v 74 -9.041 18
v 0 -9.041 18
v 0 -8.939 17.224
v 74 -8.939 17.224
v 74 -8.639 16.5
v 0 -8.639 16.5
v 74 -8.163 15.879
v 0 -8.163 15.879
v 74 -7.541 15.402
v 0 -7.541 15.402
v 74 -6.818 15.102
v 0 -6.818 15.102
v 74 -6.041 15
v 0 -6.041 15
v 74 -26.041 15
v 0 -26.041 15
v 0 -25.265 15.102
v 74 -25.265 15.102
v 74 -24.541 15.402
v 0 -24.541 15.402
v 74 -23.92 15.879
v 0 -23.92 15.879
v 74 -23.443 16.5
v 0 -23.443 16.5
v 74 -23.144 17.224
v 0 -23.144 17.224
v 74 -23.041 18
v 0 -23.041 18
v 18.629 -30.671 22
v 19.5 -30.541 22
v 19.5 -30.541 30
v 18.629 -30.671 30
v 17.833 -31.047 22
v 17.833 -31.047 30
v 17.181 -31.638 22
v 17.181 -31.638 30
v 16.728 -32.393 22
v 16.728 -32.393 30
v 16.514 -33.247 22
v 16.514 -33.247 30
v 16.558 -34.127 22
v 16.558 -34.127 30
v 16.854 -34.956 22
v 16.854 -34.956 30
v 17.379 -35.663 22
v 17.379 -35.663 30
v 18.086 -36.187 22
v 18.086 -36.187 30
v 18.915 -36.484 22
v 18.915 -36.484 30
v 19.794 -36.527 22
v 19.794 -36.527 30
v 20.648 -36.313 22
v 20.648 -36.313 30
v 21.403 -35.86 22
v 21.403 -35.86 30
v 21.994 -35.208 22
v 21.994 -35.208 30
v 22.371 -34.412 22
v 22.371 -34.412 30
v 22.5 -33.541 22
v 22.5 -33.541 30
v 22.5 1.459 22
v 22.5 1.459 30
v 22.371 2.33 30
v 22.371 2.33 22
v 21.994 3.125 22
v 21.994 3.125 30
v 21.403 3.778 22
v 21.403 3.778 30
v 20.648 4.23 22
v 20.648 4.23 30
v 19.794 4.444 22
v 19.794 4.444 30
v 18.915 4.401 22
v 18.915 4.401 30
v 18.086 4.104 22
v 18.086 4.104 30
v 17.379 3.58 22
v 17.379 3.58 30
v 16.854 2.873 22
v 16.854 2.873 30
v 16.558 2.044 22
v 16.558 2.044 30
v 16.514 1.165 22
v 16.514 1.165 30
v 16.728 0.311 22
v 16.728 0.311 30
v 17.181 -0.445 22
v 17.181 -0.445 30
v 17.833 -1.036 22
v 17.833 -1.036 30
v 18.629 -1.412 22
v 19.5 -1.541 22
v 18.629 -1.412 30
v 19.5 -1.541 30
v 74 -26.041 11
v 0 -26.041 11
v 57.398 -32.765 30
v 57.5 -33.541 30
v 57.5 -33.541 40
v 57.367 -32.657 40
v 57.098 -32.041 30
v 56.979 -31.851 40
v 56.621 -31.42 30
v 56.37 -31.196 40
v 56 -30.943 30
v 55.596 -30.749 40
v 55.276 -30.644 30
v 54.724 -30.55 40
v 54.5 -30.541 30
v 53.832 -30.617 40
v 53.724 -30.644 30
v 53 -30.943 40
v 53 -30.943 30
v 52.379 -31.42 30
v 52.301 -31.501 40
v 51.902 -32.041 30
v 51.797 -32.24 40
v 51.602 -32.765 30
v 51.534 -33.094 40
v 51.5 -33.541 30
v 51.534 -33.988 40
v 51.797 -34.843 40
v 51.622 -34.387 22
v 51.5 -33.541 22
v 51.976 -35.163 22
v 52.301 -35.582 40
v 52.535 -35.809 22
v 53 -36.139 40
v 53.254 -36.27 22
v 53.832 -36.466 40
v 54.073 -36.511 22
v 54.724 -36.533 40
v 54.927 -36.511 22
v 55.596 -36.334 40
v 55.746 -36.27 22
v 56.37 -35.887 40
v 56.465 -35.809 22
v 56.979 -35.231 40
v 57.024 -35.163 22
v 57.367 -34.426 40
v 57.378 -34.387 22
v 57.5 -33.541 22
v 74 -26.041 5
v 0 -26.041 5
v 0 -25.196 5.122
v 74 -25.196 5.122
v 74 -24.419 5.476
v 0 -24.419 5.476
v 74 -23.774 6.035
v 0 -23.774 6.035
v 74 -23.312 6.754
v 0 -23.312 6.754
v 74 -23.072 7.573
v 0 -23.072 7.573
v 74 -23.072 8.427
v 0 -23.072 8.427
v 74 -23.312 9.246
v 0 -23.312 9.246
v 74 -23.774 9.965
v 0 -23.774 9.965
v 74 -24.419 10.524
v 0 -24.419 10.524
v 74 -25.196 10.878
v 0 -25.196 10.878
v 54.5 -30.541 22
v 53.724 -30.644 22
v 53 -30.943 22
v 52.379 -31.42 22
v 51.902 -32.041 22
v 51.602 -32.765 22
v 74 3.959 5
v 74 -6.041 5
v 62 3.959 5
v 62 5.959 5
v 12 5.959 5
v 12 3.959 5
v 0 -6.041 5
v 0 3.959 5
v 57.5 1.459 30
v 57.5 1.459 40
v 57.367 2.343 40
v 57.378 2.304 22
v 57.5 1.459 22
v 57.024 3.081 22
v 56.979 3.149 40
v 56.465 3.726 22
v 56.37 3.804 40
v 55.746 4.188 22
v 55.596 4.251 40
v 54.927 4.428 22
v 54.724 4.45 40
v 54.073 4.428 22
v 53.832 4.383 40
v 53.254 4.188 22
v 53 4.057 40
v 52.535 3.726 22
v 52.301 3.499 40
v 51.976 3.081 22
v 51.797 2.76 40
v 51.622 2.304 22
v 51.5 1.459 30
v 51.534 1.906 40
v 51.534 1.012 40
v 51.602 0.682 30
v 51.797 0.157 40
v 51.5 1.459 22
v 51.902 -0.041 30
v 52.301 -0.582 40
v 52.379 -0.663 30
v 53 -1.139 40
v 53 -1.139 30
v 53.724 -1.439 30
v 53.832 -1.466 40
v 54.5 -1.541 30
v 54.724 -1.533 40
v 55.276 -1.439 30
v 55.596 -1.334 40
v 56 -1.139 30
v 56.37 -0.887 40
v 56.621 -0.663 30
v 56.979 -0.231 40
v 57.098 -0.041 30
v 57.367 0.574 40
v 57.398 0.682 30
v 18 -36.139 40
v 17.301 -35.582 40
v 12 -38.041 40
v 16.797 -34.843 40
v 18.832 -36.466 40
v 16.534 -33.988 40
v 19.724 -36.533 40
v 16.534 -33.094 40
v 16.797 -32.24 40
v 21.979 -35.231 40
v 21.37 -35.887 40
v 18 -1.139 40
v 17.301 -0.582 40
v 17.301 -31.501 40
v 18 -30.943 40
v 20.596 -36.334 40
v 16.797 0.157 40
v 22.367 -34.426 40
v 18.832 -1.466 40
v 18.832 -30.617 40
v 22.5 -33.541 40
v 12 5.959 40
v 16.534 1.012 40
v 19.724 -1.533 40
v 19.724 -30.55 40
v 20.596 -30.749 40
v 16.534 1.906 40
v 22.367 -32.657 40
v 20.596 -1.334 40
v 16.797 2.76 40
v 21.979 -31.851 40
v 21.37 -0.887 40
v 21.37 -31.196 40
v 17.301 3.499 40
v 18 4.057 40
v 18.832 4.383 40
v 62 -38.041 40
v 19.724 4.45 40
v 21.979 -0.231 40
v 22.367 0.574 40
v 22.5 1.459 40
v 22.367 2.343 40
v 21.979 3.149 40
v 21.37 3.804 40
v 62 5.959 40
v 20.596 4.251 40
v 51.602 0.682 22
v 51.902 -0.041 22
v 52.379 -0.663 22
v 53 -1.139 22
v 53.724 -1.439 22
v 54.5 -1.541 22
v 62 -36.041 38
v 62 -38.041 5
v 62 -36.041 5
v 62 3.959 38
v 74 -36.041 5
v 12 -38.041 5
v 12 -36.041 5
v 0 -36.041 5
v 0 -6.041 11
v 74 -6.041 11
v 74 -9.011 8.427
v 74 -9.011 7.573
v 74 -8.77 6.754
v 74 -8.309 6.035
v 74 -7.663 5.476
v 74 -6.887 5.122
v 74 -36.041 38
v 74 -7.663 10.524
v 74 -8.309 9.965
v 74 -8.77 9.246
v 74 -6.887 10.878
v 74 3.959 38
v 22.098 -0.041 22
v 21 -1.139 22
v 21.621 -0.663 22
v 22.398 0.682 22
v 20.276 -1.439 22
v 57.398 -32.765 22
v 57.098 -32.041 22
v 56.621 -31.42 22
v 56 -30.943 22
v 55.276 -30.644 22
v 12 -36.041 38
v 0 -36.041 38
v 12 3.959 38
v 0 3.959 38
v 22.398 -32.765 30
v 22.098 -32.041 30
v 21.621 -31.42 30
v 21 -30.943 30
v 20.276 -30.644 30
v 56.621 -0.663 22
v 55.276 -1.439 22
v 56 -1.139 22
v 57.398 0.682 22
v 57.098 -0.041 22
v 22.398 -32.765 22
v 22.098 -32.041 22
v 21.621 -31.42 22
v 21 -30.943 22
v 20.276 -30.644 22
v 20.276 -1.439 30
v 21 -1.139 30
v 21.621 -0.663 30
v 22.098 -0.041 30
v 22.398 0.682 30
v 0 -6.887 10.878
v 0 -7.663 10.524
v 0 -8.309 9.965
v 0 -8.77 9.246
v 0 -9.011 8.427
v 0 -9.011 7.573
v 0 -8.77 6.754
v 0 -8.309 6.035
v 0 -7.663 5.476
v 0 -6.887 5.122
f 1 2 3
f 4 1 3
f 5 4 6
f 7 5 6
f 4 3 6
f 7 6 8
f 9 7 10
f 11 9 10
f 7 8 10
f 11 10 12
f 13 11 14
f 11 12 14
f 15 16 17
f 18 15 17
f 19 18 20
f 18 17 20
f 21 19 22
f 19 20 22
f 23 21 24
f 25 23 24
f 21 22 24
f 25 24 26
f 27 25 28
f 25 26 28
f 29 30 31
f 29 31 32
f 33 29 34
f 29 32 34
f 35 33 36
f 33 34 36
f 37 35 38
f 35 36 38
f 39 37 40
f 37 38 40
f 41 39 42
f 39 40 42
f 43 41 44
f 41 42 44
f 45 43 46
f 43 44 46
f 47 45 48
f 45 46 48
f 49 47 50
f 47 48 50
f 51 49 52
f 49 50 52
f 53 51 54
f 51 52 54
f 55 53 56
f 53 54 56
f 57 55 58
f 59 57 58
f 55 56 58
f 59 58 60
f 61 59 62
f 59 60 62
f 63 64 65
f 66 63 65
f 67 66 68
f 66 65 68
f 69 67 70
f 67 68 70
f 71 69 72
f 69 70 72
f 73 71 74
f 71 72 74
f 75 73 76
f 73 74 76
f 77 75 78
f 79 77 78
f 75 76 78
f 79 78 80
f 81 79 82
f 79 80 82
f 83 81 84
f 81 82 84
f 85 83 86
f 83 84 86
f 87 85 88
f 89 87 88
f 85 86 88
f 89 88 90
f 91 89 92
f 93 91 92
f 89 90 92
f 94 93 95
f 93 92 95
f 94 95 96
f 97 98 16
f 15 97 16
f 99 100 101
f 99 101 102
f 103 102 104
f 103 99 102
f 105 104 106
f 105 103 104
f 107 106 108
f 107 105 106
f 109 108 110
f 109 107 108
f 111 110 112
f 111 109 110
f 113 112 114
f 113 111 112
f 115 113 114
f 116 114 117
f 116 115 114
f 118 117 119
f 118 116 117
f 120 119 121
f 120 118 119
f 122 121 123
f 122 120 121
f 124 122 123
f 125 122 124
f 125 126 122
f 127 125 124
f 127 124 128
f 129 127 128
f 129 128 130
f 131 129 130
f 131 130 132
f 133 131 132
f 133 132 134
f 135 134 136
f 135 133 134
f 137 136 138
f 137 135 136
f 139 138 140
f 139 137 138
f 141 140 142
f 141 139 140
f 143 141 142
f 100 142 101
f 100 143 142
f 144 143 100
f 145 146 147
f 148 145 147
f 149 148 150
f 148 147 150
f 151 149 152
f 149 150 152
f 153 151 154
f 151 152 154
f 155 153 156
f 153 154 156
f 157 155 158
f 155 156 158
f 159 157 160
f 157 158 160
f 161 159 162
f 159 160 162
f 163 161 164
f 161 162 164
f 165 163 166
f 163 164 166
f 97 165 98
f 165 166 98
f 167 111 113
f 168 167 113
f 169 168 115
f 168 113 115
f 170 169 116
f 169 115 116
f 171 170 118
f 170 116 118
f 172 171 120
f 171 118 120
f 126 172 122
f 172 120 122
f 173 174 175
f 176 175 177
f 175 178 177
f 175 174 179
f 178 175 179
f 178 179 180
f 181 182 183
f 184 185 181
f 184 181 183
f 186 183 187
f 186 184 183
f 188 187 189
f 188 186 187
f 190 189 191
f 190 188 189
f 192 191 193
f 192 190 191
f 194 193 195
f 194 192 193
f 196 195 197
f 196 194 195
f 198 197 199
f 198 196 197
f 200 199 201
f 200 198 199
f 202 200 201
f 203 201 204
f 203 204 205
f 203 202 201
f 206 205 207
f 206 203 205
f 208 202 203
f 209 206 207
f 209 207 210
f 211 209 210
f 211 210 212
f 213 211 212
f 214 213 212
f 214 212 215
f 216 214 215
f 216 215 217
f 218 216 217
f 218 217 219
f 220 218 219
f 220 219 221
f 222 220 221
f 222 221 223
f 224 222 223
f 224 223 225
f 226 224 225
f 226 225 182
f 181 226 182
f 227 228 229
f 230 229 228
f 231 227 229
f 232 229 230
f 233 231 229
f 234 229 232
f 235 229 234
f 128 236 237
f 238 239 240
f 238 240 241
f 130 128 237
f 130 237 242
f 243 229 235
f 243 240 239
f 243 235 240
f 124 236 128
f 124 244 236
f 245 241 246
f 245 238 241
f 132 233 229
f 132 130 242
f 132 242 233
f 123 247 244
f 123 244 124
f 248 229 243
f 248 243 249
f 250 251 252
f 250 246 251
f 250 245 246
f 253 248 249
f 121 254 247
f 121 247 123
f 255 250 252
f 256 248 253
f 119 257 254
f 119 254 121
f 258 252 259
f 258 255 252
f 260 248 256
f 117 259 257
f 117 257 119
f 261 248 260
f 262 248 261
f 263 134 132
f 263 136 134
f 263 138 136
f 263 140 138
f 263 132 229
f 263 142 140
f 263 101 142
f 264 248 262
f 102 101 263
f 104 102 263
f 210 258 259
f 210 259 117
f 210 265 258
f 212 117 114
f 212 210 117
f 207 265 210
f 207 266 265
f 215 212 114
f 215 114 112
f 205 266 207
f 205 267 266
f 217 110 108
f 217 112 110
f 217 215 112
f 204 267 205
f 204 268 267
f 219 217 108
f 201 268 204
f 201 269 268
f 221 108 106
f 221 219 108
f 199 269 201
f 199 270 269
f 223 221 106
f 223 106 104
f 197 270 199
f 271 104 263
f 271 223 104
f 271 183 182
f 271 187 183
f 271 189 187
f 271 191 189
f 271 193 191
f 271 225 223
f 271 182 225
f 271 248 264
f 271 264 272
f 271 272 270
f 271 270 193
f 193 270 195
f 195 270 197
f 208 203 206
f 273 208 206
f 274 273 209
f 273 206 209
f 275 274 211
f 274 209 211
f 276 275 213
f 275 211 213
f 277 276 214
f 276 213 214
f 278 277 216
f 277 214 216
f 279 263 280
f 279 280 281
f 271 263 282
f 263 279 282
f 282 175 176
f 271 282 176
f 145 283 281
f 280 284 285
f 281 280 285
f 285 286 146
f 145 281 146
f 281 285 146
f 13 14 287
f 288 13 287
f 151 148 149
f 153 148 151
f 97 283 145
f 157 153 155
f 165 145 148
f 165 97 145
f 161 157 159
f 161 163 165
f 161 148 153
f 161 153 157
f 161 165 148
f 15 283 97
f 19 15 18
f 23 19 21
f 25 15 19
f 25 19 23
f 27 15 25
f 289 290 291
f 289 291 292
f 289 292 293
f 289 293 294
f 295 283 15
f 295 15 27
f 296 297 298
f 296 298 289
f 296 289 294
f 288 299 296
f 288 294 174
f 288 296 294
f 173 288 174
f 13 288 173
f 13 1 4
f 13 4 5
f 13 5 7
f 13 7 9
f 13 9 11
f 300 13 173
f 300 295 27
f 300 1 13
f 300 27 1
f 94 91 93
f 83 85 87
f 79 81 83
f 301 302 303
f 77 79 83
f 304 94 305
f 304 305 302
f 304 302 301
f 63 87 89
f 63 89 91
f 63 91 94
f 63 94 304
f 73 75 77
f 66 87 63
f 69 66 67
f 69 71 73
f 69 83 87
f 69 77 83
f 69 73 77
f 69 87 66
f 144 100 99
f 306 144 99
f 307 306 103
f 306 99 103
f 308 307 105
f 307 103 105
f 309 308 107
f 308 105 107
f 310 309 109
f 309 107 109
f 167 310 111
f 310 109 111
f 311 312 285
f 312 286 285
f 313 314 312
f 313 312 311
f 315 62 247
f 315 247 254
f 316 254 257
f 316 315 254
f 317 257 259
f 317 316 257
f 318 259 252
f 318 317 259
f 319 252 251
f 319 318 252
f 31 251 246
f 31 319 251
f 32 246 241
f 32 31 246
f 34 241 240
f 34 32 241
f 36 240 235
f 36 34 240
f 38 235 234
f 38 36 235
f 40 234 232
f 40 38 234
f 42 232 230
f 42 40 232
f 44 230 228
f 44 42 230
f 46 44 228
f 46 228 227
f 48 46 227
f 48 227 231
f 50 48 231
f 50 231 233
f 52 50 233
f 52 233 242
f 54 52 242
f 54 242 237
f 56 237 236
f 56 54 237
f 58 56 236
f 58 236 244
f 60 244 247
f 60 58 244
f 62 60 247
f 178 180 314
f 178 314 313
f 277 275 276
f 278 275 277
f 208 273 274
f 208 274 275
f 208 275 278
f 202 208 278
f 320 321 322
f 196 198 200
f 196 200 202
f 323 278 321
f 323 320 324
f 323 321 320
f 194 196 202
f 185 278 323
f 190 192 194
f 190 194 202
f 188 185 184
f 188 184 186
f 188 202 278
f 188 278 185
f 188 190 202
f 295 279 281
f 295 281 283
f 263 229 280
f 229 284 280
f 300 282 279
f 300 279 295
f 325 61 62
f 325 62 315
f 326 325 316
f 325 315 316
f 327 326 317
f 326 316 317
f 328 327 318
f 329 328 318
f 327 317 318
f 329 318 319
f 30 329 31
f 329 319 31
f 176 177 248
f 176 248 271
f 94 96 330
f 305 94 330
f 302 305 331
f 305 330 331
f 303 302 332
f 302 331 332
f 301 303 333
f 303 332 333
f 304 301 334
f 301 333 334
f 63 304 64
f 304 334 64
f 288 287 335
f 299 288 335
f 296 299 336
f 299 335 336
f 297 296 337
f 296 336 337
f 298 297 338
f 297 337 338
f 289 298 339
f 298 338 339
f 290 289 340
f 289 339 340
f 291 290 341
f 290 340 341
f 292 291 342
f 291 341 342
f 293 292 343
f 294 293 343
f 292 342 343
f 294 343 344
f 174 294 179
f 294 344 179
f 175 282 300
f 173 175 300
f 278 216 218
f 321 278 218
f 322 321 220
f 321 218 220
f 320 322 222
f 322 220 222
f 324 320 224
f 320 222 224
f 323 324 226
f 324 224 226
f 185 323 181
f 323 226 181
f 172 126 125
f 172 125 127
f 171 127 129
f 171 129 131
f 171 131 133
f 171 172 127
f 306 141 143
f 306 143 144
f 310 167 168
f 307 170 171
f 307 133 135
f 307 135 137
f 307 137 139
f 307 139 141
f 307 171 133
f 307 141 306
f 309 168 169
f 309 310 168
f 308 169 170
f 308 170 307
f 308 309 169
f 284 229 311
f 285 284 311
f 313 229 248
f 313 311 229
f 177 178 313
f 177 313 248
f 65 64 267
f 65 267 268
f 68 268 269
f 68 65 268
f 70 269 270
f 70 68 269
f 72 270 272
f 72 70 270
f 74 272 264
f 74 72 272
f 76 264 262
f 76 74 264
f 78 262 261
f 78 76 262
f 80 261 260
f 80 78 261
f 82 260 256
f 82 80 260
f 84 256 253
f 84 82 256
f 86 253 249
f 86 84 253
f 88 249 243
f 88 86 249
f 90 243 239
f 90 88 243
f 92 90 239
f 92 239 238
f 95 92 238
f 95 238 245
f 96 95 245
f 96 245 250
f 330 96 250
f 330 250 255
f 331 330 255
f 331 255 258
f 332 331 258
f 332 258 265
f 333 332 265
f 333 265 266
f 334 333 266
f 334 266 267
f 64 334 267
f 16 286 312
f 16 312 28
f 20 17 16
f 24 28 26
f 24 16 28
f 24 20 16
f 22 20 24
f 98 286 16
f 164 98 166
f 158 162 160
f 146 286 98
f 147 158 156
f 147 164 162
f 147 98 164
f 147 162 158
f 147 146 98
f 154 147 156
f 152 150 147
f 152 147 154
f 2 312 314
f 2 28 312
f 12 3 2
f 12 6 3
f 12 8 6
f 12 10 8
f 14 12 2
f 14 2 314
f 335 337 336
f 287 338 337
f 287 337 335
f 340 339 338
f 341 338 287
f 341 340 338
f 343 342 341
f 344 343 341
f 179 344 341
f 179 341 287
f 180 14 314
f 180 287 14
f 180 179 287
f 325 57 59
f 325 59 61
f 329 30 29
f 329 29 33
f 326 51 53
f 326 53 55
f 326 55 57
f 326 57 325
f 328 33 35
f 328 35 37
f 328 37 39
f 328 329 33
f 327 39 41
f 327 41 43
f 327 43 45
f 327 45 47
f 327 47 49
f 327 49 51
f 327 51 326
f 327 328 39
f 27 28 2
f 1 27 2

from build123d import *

# Parameters (mm, degrees)
F1_DEPTH  = 74
F2_W      = 12
F2_H      = 44
F3_DEPTH  = 2
F4_W      = 12
F4_H      = 2
F5_DEPTH  = 25
F7_DEPTH  = 8
F8_W      = 50
F8_H      = 44
F8_R      = 3
F9_DEPTH  = 10
F10_W     = 12
F10_H     = 40
F11_DEPTH = 10


with BuildPart() as f1:
    # F0 (on Right) → F1 (new body)
    with BuildSketch(Plane.YZ):
        with BuildLine():
            ThreePointArc((-26.041336, 5), (-23.041336, 8), (-26.041336, 11))
            Line((-26.041336, 11), (-26.041336, 15))
            ThreePointArc((-26.041336, 15), (-23.920016, 15.87868), (-23.041336, 18))
            Line((-23.041336, 18), (-9.041336, 18))
            ThreePointArc((-9.041336, 18), (-8.162657, 15.87868), (-6.041336, 15))
            Line((-6.041336, 15), (-6.041336, 11))
            ThreePointArc((-6.041336, 11), (-9.041336, 8), (-6.041336, 5))
            Line((-6.041336, 5), (5.958664, 5))
            Line((5.958664, 5), (5.958664, 30))
            Line((5.958664, 30), (-38.041336, 30))
            Line((-38.041336, 30), (-38.041336, 5))
            Line((-38.041336, 5), (-26.041336, 5))
        make_face()
    extrude(amount=F1_DEPTH)

    # F2 (on face) → F3 (cut)
    with BuildSketch(Plane.XY.offset(30)):
        with Locations((68, -16.041336)):
            Rectangle(F2_W, F2_H)
        with Locations((6, -16.041336)):
            Rectangle(F2_W, F2_H)
    extrude(amount=-F3_DEPTH, mode=Mode.SUBTRACT)

    # F4 (on face) → F5 (cut)
    with BuildSketch(Plane.XY.offset(30)):
        with Locations((6, 4.958664)):
            Rectangle(F4_W, F4_H)
        with Locations((6, -37.041336)):
            Rectangle(F4_W, F4_H)
        with Locations((68, -37.041336)):
            Rectangle(F4_W, F4_H)
        with Locations((68, 4.958664)):
            Rectangle(F4_W, F4_H)
    extrude(amount=-F5_DEPTH, mode=Mode.SUBTRACT)

    # F6 (on face) → F7 (cut)
    with BuildSketch(Plane.XY.offset(30)):
        with BuildLine():
            ThreePointArc((22.5, 1.458664), (17.37868, 3.579984), (19.5, -1.541336))
            ThreePointArc((19.5, -1.541336), (21.62132, -0.662657), (22.5, 1.458664))
        make_face()
        with BuildLine():
            ThreePointArc((51.5, 1.458664), (52.37868, -0.662657), (54.5, -1.541336))
            ThreePointArc((54.5, -1.541336), (56.62132, -0.662657), (57.5, 1.458664))
            ThreePointArc((57.5, 1.458664), (54.5, 4.458664), (51.5, 1.458664))
        make_face()
        with BuildLine():
            ThreePointArc((54.5, -30.541336), (52.37868, -31.420016), (51.5, -33.541336))
            ThreePointArc((51.5, -33.541336), (54.5, -36.541336), (57.5, -33.541336))
            ThreePointArc((57.5, -33.541336), (56.62132, -31.420016), (54.5, -30.541336))
        make_face()
        with BuildLine():
            ThreePointArc((19.5, -30.541336), (17.37868, -35.662657), (22.5, -33.541336))
            ThreePointArc((22.5, -33.541336), (21.62132, -31.420016), (19.5, -30.541336))
        make_face()
    extrude(amount=-F7_DEPTH, mode=Mode.SUBTRACT)

    # F8 (on face) → F9 (join)
    with BuildSketch(Plane.XY.offset(30)):
        with Locations((37, -16.041336)):
            Rectangle(F8_W, F8_H)
        with Locations((19.5, -33.541336)):
            Circle(F8_R, mode=Mode.SUBTRACT)
        with Locations((54.5, -33.541336)):
            Circle(F8_R, mode=Mode.SUBTRACT)
        with Locations((19.5, 1.458664)):
            Circle(F8_R, mode=Mode.SUBTRACT)
        with Locations((54.5, 1.458664)):
            Circle(F8_R, mode=Mode.SUBTRACT)
    extrude(amount=F9_DEPTH)

    # F10 (on face) → F11 (join)
    with BuildSketch(Plane.XY.offset(28)):
        with Locations((6, -16.041336)):
            Rectangle(F10_W, F10_H)
        with Locations((68, -16.041336)):
            Rectangle(F10_W, F10_H)
    extrude(amount=F11_DEPTH)


solid = f1.part
